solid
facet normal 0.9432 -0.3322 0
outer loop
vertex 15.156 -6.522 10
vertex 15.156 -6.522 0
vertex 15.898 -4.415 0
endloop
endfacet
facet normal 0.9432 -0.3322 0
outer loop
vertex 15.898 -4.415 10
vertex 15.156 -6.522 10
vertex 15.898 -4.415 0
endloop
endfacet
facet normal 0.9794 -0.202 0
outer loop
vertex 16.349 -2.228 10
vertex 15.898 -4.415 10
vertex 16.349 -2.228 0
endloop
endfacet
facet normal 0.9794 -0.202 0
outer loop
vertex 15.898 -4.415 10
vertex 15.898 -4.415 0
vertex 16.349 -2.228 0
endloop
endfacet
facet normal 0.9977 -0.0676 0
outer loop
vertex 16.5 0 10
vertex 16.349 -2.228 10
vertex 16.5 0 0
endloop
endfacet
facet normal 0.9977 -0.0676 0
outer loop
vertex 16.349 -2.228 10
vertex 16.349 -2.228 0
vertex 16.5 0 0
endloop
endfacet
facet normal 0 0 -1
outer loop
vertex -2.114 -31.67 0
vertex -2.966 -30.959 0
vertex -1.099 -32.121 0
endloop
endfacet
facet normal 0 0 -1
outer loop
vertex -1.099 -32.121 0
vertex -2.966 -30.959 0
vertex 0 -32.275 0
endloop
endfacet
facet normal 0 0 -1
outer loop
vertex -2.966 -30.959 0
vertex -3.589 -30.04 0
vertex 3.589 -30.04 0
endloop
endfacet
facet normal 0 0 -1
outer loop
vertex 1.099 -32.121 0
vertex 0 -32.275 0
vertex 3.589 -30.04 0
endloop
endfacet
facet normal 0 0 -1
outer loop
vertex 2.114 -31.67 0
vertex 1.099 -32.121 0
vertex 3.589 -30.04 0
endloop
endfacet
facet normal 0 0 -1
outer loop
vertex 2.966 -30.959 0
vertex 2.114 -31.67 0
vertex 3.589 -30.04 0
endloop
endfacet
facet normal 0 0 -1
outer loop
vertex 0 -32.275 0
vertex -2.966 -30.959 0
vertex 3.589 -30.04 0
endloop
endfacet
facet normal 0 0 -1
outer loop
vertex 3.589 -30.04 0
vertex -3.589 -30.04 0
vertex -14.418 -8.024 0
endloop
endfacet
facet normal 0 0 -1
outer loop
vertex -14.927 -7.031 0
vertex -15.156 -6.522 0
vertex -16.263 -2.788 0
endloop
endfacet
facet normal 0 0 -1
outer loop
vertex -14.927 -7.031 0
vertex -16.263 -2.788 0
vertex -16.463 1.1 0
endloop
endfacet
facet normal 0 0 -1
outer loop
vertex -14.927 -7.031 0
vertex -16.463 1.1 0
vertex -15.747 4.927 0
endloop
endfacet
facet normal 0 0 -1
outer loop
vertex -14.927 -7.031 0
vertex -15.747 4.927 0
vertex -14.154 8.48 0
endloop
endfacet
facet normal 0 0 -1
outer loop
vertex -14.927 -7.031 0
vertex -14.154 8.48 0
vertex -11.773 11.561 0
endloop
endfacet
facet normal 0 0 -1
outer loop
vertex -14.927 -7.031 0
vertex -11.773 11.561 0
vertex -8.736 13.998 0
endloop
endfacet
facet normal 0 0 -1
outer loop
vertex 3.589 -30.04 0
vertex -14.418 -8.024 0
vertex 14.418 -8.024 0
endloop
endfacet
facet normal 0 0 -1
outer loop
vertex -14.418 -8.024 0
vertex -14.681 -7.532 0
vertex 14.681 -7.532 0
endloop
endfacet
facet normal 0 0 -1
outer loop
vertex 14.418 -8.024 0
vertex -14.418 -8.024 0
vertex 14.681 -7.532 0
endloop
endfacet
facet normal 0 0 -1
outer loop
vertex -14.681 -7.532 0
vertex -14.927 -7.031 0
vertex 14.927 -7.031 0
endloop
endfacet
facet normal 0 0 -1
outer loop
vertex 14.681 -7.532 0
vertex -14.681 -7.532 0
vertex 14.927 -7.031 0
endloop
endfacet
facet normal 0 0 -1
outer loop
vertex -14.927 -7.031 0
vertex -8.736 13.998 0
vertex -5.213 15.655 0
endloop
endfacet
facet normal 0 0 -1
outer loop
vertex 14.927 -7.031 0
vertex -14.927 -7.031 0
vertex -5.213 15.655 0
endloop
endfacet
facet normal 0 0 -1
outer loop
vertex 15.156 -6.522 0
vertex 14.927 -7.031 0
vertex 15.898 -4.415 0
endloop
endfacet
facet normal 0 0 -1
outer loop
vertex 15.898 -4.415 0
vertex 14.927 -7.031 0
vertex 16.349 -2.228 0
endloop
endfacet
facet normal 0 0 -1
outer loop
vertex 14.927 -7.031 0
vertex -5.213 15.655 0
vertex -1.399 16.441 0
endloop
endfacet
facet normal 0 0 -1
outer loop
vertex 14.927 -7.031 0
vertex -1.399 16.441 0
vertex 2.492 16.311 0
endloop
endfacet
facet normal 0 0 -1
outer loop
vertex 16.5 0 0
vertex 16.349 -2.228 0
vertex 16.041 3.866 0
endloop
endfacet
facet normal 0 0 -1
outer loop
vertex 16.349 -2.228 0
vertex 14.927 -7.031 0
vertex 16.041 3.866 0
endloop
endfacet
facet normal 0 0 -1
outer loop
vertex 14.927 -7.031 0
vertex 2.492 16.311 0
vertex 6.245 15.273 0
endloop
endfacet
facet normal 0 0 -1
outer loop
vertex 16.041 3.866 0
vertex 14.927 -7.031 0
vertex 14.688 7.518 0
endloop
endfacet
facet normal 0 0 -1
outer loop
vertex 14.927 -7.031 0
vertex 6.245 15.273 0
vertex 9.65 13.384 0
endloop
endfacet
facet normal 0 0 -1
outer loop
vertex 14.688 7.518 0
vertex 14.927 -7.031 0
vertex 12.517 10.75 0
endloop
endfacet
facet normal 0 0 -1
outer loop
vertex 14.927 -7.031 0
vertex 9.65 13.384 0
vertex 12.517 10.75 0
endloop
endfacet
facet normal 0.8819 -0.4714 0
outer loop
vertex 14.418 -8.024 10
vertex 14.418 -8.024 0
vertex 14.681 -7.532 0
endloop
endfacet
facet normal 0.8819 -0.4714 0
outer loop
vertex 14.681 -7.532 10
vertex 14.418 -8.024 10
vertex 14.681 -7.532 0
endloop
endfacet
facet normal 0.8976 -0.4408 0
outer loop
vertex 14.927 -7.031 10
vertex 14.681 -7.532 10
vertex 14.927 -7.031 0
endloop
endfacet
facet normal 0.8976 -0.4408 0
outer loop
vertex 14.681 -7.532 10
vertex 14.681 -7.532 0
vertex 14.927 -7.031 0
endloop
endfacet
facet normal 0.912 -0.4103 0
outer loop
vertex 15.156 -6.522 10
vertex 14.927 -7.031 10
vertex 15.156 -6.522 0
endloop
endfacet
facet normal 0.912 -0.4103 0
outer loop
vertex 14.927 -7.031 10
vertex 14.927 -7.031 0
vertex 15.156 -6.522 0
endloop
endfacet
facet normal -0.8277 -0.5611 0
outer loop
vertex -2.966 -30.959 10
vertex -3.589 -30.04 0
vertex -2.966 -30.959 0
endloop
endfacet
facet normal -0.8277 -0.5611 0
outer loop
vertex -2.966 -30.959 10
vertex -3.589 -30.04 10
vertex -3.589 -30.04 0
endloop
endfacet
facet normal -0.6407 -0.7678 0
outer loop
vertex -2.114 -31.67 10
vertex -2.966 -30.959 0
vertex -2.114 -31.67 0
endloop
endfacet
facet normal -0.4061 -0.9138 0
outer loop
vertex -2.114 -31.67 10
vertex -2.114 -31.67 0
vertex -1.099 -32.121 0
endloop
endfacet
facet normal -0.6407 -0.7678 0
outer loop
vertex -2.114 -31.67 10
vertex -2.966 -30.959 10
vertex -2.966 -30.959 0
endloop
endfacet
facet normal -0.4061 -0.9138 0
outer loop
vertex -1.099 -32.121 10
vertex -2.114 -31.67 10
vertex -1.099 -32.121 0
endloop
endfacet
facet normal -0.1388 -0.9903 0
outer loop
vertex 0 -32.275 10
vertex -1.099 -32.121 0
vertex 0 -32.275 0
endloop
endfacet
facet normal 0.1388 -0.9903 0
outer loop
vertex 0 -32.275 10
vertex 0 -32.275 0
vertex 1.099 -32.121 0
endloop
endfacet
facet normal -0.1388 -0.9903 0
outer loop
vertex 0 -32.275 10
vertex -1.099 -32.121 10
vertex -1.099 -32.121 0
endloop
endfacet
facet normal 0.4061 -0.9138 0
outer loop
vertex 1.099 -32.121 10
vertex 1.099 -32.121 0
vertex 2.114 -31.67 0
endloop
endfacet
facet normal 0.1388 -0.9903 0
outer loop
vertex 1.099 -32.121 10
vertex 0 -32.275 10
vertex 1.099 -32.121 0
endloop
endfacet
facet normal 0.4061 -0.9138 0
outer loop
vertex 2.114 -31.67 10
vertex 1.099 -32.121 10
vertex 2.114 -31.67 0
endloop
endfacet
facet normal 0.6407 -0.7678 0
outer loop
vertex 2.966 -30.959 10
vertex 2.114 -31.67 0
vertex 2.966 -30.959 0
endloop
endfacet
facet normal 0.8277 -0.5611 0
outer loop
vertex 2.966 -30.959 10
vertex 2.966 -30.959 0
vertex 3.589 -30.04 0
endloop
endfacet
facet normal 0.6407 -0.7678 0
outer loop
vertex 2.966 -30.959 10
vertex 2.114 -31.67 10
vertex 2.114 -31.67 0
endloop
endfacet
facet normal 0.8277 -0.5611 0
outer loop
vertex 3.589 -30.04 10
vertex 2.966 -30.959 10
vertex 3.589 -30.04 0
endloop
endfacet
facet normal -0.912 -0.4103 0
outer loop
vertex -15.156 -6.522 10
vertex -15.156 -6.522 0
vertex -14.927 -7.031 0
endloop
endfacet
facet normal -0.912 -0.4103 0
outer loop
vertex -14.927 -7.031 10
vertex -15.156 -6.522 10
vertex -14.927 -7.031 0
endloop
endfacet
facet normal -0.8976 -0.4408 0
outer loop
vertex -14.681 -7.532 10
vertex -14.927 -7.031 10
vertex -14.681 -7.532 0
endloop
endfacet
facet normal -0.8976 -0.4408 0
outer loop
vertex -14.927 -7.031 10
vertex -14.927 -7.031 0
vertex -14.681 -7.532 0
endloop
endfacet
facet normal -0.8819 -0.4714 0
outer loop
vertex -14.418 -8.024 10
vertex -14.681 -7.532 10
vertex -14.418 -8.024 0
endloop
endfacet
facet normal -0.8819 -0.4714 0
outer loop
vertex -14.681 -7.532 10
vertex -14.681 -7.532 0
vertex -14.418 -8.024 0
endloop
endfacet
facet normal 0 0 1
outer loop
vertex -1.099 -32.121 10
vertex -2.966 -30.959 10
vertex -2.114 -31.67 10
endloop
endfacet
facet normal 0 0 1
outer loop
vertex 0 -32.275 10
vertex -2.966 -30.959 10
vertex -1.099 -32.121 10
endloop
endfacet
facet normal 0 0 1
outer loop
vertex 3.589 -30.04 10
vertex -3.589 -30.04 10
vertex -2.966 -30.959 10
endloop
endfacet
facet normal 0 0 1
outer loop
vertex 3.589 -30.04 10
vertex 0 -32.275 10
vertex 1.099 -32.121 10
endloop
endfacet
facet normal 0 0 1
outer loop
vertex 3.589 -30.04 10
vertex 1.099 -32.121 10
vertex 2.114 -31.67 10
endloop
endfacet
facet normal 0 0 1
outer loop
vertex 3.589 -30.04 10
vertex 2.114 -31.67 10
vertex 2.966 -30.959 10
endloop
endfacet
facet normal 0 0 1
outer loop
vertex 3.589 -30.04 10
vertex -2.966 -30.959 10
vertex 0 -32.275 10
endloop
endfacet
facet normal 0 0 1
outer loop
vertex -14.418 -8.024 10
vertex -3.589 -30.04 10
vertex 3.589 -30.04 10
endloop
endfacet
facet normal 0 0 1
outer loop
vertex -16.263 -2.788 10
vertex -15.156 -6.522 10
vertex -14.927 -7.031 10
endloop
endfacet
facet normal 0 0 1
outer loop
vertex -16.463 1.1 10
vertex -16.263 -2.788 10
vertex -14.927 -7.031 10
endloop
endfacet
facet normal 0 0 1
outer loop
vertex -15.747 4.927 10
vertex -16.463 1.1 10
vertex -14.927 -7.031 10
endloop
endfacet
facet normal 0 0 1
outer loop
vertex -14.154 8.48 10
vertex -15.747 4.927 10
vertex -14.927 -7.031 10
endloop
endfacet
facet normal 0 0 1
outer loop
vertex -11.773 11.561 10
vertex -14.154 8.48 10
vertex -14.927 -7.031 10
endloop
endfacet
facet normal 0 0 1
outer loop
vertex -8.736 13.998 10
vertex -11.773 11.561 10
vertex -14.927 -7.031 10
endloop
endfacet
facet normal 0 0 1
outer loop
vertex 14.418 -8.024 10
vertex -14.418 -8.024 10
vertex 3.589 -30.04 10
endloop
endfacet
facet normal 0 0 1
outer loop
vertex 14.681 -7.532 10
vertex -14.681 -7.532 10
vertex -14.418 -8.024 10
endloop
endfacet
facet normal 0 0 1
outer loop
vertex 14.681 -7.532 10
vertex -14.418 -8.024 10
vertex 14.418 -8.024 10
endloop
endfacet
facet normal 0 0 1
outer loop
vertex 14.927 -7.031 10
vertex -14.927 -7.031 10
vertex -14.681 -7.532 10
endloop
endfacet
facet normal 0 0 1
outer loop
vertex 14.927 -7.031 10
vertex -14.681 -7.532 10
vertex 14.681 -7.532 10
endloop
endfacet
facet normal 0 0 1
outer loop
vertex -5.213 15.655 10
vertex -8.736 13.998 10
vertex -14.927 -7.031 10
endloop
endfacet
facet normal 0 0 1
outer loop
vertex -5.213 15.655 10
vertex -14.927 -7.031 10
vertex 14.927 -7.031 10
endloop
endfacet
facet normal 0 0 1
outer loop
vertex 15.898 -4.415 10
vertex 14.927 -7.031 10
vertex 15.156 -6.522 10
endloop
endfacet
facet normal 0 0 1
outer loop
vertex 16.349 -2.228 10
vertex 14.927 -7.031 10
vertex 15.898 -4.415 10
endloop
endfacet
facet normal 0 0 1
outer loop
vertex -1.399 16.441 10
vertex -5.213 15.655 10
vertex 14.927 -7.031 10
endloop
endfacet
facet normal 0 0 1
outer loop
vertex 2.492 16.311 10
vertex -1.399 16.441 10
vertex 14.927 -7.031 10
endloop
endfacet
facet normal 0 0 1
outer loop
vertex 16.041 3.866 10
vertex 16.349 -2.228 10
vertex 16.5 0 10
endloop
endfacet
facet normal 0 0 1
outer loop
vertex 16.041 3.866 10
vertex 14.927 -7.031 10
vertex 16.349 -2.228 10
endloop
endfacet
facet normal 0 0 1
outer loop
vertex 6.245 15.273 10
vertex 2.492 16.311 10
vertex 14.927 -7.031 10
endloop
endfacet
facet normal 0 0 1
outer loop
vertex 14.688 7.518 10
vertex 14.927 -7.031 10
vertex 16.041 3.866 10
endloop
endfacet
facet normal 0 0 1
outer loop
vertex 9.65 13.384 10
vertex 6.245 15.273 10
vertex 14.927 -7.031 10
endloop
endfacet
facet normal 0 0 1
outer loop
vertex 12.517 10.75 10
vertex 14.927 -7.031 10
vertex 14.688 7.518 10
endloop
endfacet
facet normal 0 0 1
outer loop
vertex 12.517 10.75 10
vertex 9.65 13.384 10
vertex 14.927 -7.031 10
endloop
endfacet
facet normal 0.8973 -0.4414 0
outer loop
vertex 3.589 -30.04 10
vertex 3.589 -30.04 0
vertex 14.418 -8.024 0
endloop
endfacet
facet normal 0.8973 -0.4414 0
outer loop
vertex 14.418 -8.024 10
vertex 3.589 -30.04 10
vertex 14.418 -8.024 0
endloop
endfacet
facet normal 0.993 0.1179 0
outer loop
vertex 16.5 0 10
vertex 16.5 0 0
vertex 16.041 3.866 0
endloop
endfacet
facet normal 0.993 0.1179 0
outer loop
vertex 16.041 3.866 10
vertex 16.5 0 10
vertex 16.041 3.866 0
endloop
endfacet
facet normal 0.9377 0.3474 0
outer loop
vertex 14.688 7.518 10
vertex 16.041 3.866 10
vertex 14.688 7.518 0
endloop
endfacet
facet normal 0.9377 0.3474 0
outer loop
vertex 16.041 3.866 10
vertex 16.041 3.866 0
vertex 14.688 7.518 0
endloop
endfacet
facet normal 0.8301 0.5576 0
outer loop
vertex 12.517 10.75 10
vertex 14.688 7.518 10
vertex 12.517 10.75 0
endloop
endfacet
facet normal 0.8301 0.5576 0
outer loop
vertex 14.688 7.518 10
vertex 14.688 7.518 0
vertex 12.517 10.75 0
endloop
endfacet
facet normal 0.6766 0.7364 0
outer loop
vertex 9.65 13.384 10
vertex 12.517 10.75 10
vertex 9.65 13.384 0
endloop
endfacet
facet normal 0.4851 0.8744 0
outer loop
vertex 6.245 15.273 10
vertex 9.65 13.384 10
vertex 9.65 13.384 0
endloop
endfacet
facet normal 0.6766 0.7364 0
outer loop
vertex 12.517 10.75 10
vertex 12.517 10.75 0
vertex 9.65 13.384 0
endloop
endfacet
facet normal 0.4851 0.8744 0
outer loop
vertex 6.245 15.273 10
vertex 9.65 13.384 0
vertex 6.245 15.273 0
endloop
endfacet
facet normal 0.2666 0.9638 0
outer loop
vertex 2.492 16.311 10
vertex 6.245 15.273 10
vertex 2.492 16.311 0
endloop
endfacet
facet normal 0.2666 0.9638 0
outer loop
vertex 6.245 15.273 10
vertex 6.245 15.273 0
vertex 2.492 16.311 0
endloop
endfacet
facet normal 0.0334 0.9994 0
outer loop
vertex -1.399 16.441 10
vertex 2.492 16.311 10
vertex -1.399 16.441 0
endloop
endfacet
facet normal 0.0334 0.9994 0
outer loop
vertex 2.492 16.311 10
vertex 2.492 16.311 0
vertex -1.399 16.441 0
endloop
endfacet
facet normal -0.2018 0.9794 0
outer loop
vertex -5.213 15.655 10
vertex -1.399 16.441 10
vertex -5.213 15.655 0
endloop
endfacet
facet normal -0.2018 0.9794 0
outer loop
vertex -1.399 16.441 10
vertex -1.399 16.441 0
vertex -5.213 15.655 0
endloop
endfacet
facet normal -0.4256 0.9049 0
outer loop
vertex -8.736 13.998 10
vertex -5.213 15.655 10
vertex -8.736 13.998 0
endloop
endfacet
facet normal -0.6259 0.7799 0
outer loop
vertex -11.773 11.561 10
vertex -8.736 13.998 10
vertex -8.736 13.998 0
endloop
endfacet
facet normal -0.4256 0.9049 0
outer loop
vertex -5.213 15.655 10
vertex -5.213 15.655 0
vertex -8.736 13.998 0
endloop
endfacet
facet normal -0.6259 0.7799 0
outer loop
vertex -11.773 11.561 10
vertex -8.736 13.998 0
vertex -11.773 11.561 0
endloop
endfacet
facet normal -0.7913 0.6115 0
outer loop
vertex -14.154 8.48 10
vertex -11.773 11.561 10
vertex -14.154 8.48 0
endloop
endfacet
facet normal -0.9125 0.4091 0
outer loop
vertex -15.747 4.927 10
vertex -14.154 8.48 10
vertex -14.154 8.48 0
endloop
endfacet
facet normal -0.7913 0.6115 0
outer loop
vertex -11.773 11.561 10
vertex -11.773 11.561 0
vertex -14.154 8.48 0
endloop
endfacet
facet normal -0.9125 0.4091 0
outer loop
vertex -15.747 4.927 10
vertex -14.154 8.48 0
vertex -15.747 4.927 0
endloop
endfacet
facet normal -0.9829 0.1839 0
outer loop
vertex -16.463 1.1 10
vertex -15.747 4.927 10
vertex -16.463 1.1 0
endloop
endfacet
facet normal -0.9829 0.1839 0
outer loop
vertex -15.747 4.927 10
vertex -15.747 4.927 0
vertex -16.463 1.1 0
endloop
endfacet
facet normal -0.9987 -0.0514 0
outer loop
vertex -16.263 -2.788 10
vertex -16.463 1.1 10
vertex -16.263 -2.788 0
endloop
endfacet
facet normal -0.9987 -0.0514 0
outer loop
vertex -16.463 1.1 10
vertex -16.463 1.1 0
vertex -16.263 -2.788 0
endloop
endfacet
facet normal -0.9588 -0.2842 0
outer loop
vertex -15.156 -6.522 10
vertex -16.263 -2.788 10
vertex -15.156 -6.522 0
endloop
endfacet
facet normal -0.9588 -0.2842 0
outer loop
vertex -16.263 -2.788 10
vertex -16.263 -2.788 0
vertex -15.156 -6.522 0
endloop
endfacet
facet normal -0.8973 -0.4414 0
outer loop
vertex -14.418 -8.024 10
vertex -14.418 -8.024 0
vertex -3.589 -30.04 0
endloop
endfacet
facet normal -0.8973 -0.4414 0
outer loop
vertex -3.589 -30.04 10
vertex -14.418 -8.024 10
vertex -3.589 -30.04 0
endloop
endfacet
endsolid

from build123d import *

# Parameters (mm, degrees)
F1_DEPTH = 10
F2_R     = 4


with BuildPart() as f1:
    # F0 (on Top) → F1 (new body)
    with BuildSketch(Plane.XY):
        with BuildLine():
            Line((-14.4176203235, -8.0238534513), (-15.1564685919, -6.5216148171))
            ThreePointArc((-15.1564685919, -6.5216148171), (-14.8061090102, -7.2821106815), (-14.4176203235, -8.0238534513))
        make_face()
        with BuildLine():
            ThreePointArc((14.4176203235, -8.0238534513), (0, -16.5), (-14.4176203235, -8.0238534513))
            Line((-14.4176203235, -8.0238534513), (0, -37.3379997909))
            Line((0, -37.3379997909), (14.4176203235, -8.0238534513))
        make_face()
        with BuildLine():
            ThreePointArc((14.4176203235, -8.0238534513), (14.8061090102, -7.2821106815), (15.1564685919, -6.5216148171))
            Line((15.1564685919, -6.5216148171), (14.4176203235, -8.0238534513))
        make_face()
        with BuildLine():
            ThreePointArc((15.1564685919, -6.5216148171), (16.1606270263, -3.329284325), (16.5, 0))
            ThreePointArc((16.5, 0), (-3.329284325, 16.1606270263), (-15.1564685919, -6.5216148171))
            Line((-15.1564685919, -6.5216148171), (-14.4176203235, -8.0238534513))
            ThreePointArc((-14.4176203235, -8.0238534513), (0, -16.5), (14.4176203235, -8.0238534513))
            Line((14.4176203235, -8.0238534513), (15.1564685919, -6.5216148171))
        make_face()
    extrude(amount=F1_DEPTH)

    # F2
    f2_edges = [f1.edges().sort_by_distance(p)[0] for p in [
        (0, -37.338, 5),
    ]]
    fillet(f2_edges, radius=F2_R)


solid = f1.part
